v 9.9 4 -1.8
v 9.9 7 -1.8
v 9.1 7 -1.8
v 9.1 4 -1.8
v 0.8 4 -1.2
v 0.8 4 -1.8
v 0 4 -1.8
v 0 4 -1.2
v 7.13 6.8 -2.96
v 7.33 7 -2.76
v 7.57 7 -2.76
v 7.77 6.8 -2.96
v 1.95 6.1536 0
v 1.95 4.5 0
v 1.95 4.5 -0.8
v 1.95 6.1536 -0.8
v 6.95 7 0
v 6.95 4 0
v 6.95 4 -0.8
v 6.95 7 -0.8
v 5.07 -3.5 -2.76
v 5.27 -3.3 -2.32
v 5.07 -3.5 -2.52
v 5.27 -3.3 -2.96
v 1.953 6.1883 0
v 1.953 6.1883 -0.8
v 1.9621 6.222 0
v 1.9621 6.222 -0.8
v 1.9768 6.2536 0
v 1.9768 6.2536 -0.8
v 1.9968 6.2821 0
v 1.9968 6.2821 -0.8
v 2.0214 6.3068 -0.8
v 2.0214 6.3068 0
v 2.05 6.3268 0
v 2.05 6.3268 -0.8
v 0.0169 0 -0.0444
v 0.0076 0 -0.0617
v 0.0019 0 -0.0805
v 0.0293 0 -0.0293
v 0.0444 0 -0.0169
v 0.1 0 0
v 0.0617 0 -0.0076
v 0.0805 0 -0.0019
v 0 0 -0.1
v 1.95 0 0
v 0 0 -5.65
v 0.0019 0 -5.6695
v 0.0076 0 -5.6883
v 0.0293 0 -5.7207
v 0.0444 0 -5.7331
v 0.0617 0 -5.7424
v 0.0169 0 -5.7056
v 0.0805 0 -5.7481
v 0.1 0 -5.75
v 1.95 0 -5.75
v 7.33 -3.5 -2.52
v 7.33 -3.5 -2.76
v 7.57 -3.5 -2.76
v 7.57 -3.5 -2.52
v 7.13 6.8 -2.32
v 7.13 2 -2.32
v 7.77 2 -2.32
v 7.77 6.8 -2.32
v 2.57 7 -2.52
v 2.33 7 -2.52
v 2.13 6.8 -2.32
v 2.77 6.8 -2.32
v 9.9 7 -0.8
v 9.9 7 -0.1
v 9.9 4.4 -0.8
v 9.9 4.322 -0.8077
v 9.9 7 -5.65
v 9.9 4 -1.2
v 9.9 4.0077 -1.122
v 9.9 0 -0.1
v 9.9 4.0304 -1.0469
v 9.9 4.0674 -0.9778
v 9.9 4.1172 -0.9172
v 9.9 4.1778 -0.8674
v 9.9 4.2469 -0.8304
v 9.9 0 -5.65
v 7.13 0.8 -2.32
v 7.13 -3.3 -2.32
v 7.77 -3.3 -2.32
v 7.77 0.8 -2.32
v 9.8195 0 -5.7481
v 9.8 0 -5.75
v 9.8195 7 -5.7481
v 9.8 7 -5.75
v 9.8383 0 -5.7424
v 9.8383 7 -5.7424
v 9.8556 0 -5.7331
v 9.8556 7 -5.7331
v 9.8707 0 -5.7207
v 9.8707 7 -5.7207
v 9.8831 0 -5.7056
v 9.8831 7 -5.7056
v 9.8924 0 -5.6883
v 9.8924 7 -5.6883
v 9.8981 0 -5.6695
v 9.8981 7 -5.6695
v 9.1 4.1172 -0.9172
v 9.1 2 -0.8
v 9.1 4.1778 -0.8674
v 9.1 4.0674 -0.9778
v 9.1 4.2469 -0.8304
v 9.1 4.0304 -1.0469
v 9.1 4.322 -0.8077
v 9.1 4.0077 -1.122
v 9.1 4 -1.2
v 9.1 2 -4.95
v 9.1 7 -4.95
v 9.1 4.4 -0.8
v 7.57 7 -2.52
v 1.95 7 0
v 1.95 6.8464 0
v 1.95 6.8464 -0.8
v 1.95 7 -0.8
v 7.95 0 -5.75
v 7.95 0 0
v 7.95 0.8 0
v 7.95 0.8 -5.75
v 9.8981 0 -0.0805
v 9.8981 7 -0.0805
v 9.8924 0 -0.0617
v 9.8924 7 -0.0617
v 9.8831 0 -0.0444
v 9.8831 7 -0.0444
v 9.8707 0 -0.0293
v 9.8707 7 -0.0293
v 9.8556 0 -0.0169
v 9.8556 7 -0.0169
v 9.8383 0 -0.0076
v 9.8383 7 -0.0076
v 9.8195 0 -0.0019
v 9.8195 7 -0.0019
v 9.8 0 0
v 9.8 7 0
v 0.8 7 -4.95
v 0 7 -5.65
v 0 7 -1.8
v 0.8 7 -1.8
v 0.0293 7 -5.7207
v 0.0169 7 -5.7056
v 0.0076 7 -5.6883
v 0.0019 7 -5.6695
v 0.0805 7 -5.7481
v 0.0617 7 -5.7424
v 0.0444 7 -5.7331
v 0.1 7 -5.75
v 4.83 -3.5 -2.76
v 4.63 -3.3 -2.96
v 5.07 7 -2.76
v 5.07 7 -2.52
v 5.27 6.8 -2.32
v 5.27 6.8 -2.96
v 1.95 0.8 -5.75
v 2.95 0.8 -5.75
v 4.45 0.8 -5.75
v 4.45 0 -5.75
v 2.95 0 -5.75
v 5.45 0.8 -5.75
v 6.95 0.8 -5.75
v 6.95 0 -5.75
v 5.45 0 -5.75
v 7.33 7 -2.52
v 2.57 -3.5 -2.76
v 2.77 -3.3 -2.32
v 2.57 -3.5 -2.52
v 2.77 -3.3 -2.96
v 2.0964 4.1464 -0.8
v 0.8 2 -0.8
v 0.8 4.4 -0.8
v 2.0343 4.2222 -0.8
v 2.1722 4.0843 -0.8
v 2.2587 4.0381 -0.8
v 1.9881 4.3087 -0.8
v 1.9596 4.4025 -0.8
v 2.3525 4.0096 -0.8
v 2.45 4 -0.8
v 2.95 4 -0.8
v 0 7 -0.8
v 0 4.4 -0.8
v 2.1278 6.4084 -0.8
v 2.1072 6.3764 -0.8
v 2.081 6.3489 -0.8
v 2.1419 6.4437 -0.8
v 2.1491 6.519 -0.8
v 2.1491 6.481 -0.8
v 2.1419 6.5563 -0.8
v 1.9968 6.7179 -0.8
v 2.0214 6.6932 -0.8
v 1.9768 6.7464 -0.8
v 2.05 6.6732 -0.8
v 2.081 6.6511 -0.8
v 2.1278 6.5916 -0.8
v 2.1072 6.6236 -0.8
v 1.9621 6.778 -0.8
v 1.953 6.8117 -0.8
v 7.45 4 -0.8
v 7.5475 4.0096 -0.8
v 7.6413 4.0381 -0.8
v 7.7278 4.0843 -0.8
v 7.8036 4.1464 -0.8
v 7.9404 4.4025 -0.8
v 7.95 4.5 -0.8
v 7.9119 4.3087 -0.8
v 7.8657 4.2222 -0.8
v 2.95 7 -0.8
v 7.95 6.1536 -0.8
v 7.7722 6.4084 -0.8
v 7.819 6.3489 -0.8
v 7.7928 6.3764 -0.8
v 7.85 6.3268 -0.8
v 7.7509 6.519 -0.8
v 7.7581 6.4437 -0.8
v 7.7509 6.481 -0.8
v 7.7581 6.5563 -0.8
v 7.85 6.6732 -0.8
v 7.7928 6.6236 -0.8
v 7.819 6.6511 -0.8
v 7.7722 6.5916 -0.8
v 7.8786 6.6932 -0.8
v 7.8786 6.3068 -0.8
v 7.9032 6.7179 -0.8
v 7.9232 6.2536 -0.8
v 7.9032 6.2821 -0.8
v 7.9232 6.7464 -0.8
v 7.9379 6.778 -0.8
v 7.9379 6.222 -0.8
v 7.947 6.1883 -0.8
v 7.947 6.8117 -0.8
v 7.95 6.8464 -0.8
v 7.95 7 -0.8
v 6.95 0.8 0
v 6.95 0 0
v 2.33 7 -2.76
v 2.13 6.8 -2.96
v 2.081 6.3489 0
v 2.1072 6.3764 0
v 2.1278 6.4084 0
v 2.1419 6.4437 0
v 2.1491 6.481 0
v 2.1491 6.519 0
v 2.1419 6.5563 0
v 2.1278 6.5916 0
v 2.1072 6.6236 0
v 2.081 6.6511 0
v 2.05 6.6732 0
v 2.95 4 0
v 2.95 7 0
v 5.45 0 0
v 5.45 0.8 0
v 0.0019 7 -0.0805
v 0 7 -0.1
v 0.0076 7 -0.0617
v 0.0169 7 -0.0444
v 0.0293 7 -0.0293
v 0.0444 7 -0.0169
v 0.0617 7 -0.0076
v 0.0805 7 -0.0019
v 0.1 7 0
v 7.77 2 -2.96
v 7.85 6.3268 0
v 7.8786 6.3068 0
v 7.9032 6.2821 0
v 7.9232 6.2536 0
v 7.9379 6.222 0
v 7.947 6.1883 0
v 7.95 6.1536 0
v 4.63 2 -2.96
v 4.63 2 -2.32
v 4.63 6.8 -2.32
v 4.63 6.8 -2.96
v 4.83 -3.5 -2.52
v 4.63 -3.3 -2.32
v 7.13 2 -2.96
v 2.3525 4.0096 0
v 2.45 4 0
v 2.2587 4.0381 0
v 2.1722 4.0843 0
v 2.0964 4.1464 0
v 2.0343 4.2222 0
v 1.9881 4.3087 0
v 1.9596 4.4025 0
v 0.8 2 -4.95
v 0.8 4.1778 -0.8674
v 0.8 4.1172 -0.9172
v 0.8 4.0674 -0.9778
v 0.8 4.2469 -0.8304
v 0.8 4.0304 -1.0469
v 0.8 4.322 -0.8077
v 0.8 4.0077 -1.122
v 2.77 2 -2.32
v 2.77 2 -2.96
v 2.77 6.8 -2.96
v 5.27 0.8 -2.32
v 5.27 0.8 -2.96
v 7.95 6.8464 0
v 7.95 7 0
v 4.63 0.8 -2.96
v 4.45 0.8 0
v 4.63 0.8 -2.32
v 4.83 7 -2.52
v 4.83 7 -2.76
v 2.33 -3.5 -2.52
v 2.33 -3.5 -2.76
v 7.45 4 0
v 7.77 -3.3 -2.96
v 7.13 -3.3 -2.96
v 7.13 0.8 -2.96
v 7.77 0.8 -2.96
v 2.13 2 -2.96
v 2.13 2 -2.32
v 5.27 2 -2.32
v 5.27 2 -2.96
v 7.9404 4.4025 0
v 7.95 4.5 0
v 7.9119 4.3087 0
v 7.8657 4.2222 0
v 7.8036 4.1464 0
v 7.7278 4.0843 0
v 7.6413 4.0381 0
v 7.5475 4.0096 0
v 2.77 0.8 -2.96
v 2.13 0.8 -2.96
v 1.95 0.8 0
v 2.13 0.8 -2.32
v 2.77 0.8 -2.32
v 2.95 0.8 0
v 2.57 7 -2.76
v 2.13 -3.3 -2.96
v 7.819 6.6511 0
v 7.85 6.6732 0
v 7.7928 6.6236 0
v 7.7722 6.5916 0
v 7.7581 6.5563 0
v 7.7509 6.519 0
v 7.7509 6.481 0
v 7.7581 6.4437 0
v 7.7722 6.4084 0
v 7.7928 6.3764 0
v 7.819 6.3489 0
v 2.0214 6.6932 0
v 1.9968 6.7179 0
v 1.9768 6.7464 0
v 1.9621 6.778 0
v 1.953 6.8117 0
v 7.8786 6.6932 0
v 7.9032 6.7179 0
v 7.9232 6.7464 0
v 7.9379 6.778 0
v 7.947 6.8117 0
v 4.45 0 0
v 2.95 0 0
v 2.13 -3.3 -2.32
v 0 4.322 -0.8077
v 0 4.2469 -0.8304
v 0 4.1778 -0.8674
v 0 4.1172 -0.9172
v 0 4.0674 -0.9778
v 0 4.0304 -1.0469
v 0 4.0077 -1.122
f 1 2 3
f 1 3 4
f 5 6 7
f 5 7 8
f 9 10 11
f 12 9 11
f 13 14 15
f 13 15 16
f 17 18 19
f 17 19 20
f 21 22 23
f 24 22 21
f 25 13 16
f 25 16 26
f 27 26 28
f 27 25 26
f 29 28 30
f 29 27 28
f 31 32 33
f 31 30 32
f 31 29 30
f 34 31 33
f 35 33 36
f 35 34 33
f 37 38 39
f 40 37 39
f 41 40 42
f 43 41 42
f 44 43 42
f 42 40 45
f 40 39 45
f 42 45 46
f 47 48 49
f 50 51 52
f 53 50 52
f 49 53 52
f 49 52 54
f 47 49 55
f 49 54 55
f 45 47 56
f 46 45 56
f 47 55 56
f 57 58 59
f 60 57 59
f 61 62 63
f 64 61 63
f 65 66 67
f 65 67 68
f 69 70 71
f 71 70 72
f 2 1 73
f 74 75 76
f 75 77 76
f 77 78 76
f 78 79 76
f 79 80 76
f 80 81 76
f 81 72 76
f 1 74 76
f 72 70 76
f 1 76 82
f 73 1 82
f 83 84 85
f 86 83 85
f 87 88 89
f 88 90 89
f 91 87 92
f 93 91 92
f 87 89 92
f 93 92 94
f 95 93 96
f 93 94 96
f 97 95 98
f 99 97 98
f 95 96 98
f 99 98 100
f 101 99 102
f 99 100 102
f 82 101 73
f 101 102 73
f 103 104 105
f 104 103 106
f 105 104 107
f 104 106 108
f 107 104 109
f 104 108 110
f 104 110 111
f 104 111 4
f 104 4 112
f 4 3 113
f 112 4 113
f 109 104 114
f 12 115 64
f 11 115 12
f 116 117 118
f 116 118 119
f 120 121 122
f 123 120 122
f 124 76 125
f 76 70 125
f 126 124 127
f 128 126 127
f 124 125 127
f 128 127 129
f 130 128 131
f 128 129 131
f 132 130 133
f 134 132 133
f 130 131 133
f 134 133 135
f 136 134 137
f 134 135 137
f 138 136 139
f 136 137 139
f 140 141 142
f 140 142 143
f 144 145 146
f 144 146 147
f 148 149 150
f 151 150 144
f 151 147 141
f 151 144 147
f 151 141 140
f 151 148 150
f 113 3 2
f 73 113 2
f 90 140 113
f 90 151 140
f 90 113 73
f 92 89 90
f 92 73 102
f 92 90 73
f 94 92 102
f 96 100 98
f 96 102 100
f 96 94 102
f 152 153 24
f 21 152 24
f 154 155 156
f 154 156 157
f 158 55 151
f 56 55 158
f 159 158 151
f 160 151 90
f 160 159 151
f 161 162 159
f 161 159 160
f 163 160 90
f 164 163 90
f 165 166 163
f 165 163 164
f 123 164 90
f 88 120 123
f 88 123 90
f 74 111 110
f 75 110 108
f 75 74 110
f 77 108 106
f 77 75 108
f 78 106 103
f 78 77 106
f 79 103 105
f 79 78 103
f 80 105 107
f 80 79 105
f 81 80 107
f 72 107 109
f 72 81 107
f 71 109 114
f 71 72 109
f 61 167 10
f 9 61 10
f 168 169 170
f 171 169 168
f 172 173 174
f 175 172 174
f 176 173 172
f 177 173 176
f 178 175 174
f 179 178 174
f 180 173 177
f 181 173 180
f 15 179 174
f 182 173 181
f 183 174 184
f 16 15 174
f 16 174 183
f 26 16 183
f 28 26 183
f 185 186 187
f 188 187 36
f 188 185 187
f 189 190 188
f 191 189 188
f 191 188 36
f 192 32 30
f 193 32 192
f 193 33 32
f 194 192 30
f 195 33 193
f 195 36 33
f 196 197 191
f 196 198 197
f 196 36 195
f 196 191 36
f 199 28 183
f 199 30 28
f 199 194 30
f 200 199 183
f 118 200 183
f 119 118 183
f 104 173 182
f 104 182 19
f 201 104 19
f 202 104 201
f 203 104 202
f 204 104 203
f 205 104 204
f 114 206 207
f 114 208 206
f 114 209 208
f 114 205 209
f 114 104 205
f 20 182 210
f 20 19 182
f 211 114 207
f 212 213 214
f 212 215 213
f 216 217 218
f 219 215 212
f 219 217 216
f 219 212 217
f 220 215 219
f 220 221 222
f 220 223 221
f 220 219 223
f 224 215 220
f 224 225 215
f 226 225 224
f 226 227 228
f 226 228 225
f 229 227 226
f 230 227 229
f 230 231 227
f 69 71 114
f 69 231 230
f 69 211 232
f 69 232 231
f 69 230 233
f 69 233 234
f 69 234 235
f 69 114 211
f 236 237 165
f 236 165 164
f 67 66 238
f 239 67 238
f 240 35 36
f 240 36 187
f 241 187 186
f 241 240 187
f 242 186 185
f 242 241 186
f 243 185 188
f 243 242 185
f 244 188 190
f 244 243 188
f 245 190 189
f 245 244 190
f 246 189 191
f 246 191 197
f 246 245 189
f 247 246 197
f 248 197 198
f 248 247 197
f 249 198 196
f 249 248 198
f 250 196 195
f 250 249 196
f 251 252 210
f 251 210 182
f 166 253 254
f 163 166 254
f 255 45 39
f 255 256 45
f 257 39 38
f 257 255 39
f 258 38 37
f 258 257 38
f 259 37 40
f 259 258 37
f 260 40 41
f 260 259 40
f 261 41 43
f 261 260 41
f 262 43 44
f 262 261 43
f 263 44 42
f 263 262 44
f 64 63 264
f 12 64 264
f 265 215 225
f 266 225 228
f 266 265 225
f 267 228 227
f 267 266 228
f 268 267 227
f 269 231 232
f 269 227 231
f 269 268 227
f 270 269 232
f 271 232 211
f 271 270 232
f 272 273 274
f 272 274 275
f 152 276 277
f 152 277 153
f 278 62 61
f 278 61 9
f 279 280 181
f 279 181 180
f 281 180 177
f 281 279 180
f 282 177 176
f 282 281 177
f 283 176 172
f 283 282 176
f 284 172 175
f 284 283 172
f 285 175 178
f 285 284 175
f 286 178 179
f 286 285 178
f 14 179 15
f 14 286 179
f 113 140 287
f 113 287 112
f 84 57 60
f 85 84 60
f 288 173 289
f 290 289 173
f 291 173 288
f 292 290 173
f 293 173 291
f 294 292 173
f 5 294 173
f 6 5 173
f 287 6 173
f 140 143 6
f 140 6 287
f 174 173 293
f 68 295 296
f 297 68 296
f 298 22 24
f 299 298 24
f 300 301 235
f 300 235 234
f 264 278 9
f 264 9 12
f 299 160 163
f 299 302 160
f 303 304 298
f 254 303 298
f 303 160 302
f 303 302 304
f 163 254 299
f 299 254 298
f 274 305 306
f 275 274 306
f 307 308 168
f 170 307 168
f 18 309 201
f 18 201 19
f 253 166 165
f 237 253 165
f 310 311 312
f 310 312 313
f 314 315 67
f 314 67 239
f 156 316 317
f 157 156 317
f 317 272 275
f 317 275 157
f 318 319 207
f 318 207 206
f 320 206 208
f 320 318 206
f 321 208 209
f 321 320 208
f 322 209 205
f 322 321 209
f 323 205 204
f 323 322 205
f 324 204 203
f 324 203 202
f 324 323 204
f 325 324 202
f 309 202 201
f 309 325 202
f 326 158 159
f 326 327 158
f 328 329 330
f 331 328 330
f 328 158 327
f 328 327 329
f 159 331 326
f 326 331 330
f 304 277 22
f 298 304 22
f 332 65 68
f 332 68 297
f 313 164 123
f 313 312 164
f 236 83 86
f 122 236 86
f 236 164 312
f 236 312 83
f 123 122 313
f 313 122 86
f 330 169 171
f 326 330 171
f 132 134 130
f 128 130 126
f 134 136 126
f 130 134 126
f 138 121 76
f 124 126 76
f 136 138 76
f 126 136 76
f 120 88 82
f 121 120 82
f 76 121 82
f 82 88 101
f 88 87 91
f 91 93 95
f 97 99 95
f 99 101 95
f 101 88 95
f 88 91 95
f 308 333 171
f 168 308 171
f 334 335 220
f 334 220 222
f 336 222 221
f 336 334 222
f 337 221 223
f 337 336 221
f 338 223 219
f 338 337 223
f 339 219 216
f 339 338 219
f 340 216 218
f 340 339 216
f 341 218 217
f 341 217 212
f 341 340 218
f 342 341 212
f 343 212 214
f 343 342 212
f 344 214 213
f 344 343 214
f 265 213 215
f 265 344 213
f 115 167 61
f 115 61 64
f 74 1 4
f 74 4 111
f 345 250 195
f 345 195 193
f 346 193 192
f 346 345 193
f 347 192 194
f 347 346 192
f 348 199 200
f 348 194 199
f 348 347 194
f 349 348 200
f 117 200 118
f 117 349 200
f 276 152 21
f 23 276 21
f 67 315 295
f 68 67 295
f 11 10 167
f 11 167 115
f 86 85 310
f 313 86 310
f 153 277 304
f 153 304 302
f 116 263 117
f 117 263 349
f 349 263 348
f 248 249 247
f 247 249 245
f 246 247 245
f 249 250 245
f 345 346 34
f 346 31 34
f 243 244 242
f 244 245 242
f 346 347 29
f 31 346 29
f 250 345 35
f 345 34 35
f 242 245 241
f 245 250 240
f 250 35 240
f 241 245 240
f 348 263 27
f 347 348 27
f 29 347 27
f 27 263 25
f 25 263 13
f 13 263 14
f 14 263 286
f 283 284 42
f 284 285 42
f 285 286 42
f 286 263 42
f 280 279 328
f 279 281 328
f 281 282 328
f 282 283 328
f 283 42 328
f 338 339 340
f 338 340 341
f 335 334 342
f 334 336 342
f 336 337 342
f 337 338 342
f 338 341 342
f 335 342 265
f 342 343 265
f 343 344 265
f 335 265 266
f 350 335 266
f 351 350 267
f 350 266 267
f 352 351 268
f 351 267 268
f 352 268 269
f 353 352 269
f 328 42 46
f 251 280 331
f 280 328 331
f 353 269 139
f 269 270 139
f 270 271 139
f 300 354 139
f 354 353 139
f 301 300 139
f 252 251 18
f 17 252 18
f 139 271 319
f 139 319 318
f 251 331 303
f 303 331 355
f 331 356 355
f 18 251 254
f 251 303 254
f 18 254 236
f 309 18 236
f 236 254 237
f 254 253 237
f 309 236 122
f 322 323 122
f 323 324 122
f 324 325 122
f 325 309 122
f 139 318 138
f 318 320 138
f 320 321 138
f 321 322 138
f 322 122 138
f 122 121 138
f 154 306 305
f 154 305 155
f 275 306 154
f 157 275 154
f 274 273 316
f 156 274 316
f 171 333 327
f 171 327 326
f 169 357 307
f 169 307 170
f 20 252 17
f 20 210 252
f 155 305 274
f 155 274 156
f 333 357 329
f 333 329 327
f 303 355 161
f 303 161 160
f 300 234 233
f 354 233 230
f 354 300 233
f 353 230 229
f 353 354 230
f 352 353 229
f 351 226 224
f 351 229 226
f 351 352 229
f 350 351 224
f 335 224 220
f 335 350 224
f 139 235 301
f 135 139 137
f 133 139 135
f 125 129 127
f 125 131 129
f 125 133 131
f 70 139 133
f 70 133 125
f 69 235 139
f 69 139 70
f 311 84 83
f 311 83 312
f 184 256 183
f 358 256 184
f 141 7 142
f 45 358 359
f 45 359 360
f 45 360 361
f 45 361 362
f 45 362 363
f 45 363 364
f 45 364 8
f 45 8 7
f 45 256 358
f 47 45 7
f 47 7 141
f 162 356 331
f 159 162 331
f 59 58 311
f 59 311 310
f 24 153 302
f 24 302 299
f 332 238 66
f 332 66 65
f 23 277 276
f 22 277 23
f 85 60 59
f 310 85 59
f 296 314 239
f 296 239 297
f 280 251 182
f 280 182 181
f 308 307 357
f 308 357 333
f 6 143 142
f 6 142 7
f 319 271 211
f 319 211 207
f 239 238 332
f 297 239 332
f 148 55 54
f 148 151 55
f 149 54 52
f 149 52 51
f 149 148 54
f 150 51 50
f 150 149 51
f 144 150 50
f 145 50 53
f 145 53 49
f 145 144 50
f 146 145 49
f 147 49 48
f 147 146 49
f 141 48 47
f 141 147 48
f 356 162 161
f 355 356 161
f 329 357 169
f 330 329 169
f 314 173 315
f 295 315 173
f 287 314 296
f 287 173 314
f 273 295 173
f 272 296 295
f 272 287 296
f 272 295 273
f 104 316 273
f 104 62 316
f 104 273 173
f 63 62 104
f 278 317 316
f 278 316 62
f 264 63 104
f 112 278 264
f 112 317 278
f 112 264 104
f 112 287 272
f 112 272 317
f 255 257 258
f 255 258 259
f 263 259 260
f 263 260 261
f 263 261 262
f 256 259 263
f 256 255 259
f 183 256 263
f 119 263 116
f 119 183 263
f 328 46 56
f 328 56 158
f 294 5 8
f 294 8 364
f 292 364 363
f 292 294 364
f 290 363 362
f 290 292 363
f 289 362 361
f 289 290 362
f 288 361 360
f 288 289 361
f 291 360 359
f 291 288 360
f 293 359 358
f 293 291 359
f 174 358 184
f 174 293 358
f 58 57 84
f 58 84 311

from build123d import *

# Parameters (mm, degrees)
SKETCH_1_W                         = 9.9
SKETCH_1_H                         = 5.75
EXTRUDE_1_DEPTH                    = 7
SKETCH_2_W                         = 8.3
SKETCH_2_H                         = 4.15
CUT_EXTRUDE_1_DEPTH                = 5
CUT_EXTRUDE_2_REACH                = 15.419
SKETCH_3_W                         = 1
SKETCH_3_H                         = 0.8
EXTRUDE_START                      = -5.5
SKETCH_4_W                         = 0.64
SKETCH_4_H                         = 0.64
EXTRUDE_2_DEPTH                    = 10.5
CHAMFER_1_SIZE                     = 0.2
PATTERN_LINEAR_4_COUNT             = 3
PATTERN_LINEAR_4_PITCH             = 2.5
CHAMFER_1_OF_PATTERN_LINEAR_4_SIZE = 0.2
CUT_EXTRUDE_3_REACH                = 15.419
CUT_EXTRUDE_4_DEPTH                = 14.419109508
FILLET_1_R                         = 0.1


with BuildPart() as part:
    # Эскиз1 → Бобышка-Вытянуть1 (new body)
    with BuildSketch(Plane(origin=(0, 0, 0), x_dir=(1, 0, 0), z_dir=(0, 1, 0))):
        with Locations((4.95, 2.875)):
            Rectangle(SKETCH_1_W, SKETCH_1_H)
    extrude(amount=EXTRUDE_1_DEPTH)

    # Эскиз2 → Вырез-Вытянуть1 (cut)
    with BuildSketch(Plane(origin=(0, 7, 0), x_dir=(1, 0, 0), z_dir=(0, 1, 0))):
        with Locations((4.95, 2.875)):
            Rectangle(SKETCH_2_W, SKETCH_2_H)
    extrude(amount=-CUT_EXTRUDE_1_DEPTH, mode=Mode.SUBTRACT)

    # Эскиз3 → Вырез-Вытянуть2 (cut, up to next)
    with BuildSketch(Plane.XY, mode=Mode.PRIVATE) as cut_extrude_2_sk1:
        with Locations((2.45, 0.4)):
            Rectangle(SKETCH_3_W, SKETCH_3_H)
    cut_extrude_2_tool1 = extrude(cut_extrude_2_sk1.sketch, amount=-CUT_EXTRUDE_2_REACH, mode=Mode.PRIVATE) & part.part
    # Эскиз3 → Вырез-Вытянуть2 (cut, up to next)
    with BuildSketch(Plane.XY, mode=Mode.PRIVATE) as cut_extrude_2_sk2:
        with Locations((4.95, 0.4)):
            Rectangle(SKETCH_3_W, SKETCH_3_H)
    cut_extrude_2_tool2 = extrude(cut_extrude_2_sk2.sketch, amount=-CUT_EXTRUDE_2_REACH, mode=Mode.PRIVATE) & part.part
    # Эскиз3 → Вырез-Вытянуть2 (cut, up to next)
    with BuildSketch(Plane.XY, mode=Mode.PRIVATE) as cut_extrude_2_sk3:
        with Locations((7.45, 0.4)):
            Rectangle(SKETCH_3_W, SKETCH_3_H)
    cut_extrude_2_tool3 = extrude(cut_extrude_2_sk3.sketch, amount=-CUT_EXTRUDE_2_REACH, mode=Mode.PRIVATE) & part.part
    add(cut_extrude_2_tool1.solids().sort_by_distance((2.45, 0.4, 0))[0], mode=Mode.SUBTRACT)
    add(cut_extrude_2_tool2.solids().sort_by_distance((4.95, 0.4, 0))[0], mode=Mode.SUBTRACT)
    add(cut_extrude_2_tool3.solids().sort_by_distance((7.45, 0.4, 0))[0], mode=Mode.SUBTRACT)

    # Эскиз4 → Бобышка-Вытянуть2 (add)
    with BuildSketch(Plane(origin=(0, 2, 0), x_dir=(1, 0, 0), z_dir=(0, 1, 0)).offset(EXTRUDE_START)):
        with Locations((2.45, 2.64)):
            Rectangle(SKETCH_4_W, SKETCH_4_H)
    extrude_2 = extrude(amount=EXTRUDE_2_DEPTH)

    # Фаска1
    chamfer_1_edges = [part.edges().sort_by_distance(p)[0] for p in [
        (2.13, 7, -2.64),
        (2.13, -3.5, -2.64),
        (2.45, 7, -2.96),
        (2.45, -3.5, -2.96),
        (2.77, 7, -2.64),
        (2.77, -3.5, -2.64),
        (2.45, 7, -2.32),
        (2.45, -3.5, -2.32),
    ]]
    chamfer(chamfer_1_edges, length=CHAMFER_1_SIZE)

    # Линейный массив4: Бобышка-Вытянуть2 ×3
    with Locations(*[(i * PATTERN_LINEAR_4_PITCH, 0, 0) for i in range(1, PATTERN_LINEAR_4_COUNT)]):
        add(extrude_2)

    # Фаска1 of Линейный массив4
    chamfer_1_of_pattern_linear_4_edges = [part.edges().sort_by_distance(p)[0] for p in [
        (4.63, 7, -2.64),
        (4.63, -3.5, -2.64),
        (4.95, 7, -2.96),
        (4.95, -3.5, -2.96),
        (5.27, 7, -2.64),
        (5.27, -3.5, -2.64),
        (4.95, 7, -2.32),
        (4.95, -3.5, -2.32),
        (7.13, 7, -2.64),
        (7.13, -3.5, -2.64),
        (7.45, 7, -2.96),
        (7.45, -3.5, -2.96),
        (7.77, 7, -2.64),
        (7.77, -3.5, -2.64),
        (7.45, 7, -2.32),
        (7.45, -3.5, -2.32),
    ]]
    chamfer(chamfer_1_of_pattern_linear_4_edges, length=CHAMFER_1_OF_PATTERN_LINEAR_4_SIZE)

    # Эскиз5 → Вырез-Вытянуть3 (cut, up to next)
    with BuildSketch(Plane.XY, mode=Mode.PRIVATE) as cut_extrude_3_sk1:
        with BuildLine():
            Line((1.95, 7), (2.95, 7))
            Line((2.95, 7), (2.95, 4))
            Line((2.95, 4), (2.45, 4))
            ThreePointArc((2.45, 4), (2.096446609, 4.146446609), (1.95, 4.5))
            Line((1.95, 4.5), (1.95, 6.153589838))
            ThreePointArc((1.95, 6.153589838), (1.976794919, 6.253589838), (2.05, 6.326794919))
            ThreePointArc((2.05, 6.326794919), (2.15, 6.5), (2.05, 6.673205081))
            ThreePointArc((2.05, 6.673205081), (1.976794919, 6.746410162), (1.95, 6.846410162))
            Line((1.95, 6.846410162), (1.95, 7))
        make_face()
    cut_extrude_3_tool1 = extrude(cut_extrude_3_sk1.sketch, amount=-CUT_EXTRUDE_3_REACH, mode=Mode.PRIVATE) & part.part
    # Эскиз5 → Вырез-Вытянуть3 (cut, up to next)
    with BuildSketch(Plane.XY, mode=Mode.PRIVATE) as cut_extrude_3_sk2:
        with BuildLine():
            Line((6.95, 7), (7.95, 7))
            Line((7.95, 7), (7.95, 6.846410162))
            ThreePointArc((7.95, 6.846410162), (7.923205081, 6.746410162), (7.85, 6.673205081))
            ThreePointArc((7.85, 6.673205081), (7.75, 6.5), (7.85, 6.326794919))
            ThreePointArc((7.85, 6.326794919), (7.923205081, 6.253589838), (7.95, 6.153589838))
            Line((7.95, 6.153589838), (7.95, 4.5))
            ThreePointArc((7.95, 4.5), (7.803553391, 4.146446609), (7.45, 4))
            Line((7.45, 4), (6.95, 4))
            Line((6.95, 4), (6.95, 7))
        make_face()
    cut_extrude_3_tool2 = extrude(cut_extrude_3_sk2.sketch, amount=-CUT_EXTRUDE_3_REACH, mode=Mode.PRIVATE) & part.part
    add(cut_extrude_3_tool1.solids().sort_by_distance((2.467377, 5.501808, 0))[0], mode=Mode.SUBTRACT)
    add(cut_extrude_3_tool2.solids().sort_by_distance((7.432623, 5.501808, 0))[0], mode=Mode.SUBTRACT)

    # Эскиз6 → Вырез-Вытянуть4 (cut, through all)
    with BuildSketch(Plane(origin=(9.9, 0, 0), x_dir=(0, 0, -1), z_dir=(1, 0, 0))):
        with BuildLine():
            Line((0.8, 7), (1.8, 7))
            Line((1.8, 7), (1.8, 4))
            Line((1.8, 4), (1.2, 4))
            ThreePointArc((1.2, 4), (0.917157288, 4.117157288), (0.8, 4.4))
            Line((0.8, 4.4), (0.8, 7))
        make_face()
    extrude(amount=-CUT_EXTRUDE_4_DEPTH, mode=Mode.SUBTRACT)

    # Скругление1
    fillet_1_edges = [part.edges().sort_by_distance(p)[0] for p in [
        (0, 3.5, -5.75),
        (9.9, 3.5, -5.75),
        (9.9, 3.5, 0),
        (0, 3.5, 0),
    ]]
    fillet(fillet_1_edges, radius=FILLET_1_R)


solid = part.part
